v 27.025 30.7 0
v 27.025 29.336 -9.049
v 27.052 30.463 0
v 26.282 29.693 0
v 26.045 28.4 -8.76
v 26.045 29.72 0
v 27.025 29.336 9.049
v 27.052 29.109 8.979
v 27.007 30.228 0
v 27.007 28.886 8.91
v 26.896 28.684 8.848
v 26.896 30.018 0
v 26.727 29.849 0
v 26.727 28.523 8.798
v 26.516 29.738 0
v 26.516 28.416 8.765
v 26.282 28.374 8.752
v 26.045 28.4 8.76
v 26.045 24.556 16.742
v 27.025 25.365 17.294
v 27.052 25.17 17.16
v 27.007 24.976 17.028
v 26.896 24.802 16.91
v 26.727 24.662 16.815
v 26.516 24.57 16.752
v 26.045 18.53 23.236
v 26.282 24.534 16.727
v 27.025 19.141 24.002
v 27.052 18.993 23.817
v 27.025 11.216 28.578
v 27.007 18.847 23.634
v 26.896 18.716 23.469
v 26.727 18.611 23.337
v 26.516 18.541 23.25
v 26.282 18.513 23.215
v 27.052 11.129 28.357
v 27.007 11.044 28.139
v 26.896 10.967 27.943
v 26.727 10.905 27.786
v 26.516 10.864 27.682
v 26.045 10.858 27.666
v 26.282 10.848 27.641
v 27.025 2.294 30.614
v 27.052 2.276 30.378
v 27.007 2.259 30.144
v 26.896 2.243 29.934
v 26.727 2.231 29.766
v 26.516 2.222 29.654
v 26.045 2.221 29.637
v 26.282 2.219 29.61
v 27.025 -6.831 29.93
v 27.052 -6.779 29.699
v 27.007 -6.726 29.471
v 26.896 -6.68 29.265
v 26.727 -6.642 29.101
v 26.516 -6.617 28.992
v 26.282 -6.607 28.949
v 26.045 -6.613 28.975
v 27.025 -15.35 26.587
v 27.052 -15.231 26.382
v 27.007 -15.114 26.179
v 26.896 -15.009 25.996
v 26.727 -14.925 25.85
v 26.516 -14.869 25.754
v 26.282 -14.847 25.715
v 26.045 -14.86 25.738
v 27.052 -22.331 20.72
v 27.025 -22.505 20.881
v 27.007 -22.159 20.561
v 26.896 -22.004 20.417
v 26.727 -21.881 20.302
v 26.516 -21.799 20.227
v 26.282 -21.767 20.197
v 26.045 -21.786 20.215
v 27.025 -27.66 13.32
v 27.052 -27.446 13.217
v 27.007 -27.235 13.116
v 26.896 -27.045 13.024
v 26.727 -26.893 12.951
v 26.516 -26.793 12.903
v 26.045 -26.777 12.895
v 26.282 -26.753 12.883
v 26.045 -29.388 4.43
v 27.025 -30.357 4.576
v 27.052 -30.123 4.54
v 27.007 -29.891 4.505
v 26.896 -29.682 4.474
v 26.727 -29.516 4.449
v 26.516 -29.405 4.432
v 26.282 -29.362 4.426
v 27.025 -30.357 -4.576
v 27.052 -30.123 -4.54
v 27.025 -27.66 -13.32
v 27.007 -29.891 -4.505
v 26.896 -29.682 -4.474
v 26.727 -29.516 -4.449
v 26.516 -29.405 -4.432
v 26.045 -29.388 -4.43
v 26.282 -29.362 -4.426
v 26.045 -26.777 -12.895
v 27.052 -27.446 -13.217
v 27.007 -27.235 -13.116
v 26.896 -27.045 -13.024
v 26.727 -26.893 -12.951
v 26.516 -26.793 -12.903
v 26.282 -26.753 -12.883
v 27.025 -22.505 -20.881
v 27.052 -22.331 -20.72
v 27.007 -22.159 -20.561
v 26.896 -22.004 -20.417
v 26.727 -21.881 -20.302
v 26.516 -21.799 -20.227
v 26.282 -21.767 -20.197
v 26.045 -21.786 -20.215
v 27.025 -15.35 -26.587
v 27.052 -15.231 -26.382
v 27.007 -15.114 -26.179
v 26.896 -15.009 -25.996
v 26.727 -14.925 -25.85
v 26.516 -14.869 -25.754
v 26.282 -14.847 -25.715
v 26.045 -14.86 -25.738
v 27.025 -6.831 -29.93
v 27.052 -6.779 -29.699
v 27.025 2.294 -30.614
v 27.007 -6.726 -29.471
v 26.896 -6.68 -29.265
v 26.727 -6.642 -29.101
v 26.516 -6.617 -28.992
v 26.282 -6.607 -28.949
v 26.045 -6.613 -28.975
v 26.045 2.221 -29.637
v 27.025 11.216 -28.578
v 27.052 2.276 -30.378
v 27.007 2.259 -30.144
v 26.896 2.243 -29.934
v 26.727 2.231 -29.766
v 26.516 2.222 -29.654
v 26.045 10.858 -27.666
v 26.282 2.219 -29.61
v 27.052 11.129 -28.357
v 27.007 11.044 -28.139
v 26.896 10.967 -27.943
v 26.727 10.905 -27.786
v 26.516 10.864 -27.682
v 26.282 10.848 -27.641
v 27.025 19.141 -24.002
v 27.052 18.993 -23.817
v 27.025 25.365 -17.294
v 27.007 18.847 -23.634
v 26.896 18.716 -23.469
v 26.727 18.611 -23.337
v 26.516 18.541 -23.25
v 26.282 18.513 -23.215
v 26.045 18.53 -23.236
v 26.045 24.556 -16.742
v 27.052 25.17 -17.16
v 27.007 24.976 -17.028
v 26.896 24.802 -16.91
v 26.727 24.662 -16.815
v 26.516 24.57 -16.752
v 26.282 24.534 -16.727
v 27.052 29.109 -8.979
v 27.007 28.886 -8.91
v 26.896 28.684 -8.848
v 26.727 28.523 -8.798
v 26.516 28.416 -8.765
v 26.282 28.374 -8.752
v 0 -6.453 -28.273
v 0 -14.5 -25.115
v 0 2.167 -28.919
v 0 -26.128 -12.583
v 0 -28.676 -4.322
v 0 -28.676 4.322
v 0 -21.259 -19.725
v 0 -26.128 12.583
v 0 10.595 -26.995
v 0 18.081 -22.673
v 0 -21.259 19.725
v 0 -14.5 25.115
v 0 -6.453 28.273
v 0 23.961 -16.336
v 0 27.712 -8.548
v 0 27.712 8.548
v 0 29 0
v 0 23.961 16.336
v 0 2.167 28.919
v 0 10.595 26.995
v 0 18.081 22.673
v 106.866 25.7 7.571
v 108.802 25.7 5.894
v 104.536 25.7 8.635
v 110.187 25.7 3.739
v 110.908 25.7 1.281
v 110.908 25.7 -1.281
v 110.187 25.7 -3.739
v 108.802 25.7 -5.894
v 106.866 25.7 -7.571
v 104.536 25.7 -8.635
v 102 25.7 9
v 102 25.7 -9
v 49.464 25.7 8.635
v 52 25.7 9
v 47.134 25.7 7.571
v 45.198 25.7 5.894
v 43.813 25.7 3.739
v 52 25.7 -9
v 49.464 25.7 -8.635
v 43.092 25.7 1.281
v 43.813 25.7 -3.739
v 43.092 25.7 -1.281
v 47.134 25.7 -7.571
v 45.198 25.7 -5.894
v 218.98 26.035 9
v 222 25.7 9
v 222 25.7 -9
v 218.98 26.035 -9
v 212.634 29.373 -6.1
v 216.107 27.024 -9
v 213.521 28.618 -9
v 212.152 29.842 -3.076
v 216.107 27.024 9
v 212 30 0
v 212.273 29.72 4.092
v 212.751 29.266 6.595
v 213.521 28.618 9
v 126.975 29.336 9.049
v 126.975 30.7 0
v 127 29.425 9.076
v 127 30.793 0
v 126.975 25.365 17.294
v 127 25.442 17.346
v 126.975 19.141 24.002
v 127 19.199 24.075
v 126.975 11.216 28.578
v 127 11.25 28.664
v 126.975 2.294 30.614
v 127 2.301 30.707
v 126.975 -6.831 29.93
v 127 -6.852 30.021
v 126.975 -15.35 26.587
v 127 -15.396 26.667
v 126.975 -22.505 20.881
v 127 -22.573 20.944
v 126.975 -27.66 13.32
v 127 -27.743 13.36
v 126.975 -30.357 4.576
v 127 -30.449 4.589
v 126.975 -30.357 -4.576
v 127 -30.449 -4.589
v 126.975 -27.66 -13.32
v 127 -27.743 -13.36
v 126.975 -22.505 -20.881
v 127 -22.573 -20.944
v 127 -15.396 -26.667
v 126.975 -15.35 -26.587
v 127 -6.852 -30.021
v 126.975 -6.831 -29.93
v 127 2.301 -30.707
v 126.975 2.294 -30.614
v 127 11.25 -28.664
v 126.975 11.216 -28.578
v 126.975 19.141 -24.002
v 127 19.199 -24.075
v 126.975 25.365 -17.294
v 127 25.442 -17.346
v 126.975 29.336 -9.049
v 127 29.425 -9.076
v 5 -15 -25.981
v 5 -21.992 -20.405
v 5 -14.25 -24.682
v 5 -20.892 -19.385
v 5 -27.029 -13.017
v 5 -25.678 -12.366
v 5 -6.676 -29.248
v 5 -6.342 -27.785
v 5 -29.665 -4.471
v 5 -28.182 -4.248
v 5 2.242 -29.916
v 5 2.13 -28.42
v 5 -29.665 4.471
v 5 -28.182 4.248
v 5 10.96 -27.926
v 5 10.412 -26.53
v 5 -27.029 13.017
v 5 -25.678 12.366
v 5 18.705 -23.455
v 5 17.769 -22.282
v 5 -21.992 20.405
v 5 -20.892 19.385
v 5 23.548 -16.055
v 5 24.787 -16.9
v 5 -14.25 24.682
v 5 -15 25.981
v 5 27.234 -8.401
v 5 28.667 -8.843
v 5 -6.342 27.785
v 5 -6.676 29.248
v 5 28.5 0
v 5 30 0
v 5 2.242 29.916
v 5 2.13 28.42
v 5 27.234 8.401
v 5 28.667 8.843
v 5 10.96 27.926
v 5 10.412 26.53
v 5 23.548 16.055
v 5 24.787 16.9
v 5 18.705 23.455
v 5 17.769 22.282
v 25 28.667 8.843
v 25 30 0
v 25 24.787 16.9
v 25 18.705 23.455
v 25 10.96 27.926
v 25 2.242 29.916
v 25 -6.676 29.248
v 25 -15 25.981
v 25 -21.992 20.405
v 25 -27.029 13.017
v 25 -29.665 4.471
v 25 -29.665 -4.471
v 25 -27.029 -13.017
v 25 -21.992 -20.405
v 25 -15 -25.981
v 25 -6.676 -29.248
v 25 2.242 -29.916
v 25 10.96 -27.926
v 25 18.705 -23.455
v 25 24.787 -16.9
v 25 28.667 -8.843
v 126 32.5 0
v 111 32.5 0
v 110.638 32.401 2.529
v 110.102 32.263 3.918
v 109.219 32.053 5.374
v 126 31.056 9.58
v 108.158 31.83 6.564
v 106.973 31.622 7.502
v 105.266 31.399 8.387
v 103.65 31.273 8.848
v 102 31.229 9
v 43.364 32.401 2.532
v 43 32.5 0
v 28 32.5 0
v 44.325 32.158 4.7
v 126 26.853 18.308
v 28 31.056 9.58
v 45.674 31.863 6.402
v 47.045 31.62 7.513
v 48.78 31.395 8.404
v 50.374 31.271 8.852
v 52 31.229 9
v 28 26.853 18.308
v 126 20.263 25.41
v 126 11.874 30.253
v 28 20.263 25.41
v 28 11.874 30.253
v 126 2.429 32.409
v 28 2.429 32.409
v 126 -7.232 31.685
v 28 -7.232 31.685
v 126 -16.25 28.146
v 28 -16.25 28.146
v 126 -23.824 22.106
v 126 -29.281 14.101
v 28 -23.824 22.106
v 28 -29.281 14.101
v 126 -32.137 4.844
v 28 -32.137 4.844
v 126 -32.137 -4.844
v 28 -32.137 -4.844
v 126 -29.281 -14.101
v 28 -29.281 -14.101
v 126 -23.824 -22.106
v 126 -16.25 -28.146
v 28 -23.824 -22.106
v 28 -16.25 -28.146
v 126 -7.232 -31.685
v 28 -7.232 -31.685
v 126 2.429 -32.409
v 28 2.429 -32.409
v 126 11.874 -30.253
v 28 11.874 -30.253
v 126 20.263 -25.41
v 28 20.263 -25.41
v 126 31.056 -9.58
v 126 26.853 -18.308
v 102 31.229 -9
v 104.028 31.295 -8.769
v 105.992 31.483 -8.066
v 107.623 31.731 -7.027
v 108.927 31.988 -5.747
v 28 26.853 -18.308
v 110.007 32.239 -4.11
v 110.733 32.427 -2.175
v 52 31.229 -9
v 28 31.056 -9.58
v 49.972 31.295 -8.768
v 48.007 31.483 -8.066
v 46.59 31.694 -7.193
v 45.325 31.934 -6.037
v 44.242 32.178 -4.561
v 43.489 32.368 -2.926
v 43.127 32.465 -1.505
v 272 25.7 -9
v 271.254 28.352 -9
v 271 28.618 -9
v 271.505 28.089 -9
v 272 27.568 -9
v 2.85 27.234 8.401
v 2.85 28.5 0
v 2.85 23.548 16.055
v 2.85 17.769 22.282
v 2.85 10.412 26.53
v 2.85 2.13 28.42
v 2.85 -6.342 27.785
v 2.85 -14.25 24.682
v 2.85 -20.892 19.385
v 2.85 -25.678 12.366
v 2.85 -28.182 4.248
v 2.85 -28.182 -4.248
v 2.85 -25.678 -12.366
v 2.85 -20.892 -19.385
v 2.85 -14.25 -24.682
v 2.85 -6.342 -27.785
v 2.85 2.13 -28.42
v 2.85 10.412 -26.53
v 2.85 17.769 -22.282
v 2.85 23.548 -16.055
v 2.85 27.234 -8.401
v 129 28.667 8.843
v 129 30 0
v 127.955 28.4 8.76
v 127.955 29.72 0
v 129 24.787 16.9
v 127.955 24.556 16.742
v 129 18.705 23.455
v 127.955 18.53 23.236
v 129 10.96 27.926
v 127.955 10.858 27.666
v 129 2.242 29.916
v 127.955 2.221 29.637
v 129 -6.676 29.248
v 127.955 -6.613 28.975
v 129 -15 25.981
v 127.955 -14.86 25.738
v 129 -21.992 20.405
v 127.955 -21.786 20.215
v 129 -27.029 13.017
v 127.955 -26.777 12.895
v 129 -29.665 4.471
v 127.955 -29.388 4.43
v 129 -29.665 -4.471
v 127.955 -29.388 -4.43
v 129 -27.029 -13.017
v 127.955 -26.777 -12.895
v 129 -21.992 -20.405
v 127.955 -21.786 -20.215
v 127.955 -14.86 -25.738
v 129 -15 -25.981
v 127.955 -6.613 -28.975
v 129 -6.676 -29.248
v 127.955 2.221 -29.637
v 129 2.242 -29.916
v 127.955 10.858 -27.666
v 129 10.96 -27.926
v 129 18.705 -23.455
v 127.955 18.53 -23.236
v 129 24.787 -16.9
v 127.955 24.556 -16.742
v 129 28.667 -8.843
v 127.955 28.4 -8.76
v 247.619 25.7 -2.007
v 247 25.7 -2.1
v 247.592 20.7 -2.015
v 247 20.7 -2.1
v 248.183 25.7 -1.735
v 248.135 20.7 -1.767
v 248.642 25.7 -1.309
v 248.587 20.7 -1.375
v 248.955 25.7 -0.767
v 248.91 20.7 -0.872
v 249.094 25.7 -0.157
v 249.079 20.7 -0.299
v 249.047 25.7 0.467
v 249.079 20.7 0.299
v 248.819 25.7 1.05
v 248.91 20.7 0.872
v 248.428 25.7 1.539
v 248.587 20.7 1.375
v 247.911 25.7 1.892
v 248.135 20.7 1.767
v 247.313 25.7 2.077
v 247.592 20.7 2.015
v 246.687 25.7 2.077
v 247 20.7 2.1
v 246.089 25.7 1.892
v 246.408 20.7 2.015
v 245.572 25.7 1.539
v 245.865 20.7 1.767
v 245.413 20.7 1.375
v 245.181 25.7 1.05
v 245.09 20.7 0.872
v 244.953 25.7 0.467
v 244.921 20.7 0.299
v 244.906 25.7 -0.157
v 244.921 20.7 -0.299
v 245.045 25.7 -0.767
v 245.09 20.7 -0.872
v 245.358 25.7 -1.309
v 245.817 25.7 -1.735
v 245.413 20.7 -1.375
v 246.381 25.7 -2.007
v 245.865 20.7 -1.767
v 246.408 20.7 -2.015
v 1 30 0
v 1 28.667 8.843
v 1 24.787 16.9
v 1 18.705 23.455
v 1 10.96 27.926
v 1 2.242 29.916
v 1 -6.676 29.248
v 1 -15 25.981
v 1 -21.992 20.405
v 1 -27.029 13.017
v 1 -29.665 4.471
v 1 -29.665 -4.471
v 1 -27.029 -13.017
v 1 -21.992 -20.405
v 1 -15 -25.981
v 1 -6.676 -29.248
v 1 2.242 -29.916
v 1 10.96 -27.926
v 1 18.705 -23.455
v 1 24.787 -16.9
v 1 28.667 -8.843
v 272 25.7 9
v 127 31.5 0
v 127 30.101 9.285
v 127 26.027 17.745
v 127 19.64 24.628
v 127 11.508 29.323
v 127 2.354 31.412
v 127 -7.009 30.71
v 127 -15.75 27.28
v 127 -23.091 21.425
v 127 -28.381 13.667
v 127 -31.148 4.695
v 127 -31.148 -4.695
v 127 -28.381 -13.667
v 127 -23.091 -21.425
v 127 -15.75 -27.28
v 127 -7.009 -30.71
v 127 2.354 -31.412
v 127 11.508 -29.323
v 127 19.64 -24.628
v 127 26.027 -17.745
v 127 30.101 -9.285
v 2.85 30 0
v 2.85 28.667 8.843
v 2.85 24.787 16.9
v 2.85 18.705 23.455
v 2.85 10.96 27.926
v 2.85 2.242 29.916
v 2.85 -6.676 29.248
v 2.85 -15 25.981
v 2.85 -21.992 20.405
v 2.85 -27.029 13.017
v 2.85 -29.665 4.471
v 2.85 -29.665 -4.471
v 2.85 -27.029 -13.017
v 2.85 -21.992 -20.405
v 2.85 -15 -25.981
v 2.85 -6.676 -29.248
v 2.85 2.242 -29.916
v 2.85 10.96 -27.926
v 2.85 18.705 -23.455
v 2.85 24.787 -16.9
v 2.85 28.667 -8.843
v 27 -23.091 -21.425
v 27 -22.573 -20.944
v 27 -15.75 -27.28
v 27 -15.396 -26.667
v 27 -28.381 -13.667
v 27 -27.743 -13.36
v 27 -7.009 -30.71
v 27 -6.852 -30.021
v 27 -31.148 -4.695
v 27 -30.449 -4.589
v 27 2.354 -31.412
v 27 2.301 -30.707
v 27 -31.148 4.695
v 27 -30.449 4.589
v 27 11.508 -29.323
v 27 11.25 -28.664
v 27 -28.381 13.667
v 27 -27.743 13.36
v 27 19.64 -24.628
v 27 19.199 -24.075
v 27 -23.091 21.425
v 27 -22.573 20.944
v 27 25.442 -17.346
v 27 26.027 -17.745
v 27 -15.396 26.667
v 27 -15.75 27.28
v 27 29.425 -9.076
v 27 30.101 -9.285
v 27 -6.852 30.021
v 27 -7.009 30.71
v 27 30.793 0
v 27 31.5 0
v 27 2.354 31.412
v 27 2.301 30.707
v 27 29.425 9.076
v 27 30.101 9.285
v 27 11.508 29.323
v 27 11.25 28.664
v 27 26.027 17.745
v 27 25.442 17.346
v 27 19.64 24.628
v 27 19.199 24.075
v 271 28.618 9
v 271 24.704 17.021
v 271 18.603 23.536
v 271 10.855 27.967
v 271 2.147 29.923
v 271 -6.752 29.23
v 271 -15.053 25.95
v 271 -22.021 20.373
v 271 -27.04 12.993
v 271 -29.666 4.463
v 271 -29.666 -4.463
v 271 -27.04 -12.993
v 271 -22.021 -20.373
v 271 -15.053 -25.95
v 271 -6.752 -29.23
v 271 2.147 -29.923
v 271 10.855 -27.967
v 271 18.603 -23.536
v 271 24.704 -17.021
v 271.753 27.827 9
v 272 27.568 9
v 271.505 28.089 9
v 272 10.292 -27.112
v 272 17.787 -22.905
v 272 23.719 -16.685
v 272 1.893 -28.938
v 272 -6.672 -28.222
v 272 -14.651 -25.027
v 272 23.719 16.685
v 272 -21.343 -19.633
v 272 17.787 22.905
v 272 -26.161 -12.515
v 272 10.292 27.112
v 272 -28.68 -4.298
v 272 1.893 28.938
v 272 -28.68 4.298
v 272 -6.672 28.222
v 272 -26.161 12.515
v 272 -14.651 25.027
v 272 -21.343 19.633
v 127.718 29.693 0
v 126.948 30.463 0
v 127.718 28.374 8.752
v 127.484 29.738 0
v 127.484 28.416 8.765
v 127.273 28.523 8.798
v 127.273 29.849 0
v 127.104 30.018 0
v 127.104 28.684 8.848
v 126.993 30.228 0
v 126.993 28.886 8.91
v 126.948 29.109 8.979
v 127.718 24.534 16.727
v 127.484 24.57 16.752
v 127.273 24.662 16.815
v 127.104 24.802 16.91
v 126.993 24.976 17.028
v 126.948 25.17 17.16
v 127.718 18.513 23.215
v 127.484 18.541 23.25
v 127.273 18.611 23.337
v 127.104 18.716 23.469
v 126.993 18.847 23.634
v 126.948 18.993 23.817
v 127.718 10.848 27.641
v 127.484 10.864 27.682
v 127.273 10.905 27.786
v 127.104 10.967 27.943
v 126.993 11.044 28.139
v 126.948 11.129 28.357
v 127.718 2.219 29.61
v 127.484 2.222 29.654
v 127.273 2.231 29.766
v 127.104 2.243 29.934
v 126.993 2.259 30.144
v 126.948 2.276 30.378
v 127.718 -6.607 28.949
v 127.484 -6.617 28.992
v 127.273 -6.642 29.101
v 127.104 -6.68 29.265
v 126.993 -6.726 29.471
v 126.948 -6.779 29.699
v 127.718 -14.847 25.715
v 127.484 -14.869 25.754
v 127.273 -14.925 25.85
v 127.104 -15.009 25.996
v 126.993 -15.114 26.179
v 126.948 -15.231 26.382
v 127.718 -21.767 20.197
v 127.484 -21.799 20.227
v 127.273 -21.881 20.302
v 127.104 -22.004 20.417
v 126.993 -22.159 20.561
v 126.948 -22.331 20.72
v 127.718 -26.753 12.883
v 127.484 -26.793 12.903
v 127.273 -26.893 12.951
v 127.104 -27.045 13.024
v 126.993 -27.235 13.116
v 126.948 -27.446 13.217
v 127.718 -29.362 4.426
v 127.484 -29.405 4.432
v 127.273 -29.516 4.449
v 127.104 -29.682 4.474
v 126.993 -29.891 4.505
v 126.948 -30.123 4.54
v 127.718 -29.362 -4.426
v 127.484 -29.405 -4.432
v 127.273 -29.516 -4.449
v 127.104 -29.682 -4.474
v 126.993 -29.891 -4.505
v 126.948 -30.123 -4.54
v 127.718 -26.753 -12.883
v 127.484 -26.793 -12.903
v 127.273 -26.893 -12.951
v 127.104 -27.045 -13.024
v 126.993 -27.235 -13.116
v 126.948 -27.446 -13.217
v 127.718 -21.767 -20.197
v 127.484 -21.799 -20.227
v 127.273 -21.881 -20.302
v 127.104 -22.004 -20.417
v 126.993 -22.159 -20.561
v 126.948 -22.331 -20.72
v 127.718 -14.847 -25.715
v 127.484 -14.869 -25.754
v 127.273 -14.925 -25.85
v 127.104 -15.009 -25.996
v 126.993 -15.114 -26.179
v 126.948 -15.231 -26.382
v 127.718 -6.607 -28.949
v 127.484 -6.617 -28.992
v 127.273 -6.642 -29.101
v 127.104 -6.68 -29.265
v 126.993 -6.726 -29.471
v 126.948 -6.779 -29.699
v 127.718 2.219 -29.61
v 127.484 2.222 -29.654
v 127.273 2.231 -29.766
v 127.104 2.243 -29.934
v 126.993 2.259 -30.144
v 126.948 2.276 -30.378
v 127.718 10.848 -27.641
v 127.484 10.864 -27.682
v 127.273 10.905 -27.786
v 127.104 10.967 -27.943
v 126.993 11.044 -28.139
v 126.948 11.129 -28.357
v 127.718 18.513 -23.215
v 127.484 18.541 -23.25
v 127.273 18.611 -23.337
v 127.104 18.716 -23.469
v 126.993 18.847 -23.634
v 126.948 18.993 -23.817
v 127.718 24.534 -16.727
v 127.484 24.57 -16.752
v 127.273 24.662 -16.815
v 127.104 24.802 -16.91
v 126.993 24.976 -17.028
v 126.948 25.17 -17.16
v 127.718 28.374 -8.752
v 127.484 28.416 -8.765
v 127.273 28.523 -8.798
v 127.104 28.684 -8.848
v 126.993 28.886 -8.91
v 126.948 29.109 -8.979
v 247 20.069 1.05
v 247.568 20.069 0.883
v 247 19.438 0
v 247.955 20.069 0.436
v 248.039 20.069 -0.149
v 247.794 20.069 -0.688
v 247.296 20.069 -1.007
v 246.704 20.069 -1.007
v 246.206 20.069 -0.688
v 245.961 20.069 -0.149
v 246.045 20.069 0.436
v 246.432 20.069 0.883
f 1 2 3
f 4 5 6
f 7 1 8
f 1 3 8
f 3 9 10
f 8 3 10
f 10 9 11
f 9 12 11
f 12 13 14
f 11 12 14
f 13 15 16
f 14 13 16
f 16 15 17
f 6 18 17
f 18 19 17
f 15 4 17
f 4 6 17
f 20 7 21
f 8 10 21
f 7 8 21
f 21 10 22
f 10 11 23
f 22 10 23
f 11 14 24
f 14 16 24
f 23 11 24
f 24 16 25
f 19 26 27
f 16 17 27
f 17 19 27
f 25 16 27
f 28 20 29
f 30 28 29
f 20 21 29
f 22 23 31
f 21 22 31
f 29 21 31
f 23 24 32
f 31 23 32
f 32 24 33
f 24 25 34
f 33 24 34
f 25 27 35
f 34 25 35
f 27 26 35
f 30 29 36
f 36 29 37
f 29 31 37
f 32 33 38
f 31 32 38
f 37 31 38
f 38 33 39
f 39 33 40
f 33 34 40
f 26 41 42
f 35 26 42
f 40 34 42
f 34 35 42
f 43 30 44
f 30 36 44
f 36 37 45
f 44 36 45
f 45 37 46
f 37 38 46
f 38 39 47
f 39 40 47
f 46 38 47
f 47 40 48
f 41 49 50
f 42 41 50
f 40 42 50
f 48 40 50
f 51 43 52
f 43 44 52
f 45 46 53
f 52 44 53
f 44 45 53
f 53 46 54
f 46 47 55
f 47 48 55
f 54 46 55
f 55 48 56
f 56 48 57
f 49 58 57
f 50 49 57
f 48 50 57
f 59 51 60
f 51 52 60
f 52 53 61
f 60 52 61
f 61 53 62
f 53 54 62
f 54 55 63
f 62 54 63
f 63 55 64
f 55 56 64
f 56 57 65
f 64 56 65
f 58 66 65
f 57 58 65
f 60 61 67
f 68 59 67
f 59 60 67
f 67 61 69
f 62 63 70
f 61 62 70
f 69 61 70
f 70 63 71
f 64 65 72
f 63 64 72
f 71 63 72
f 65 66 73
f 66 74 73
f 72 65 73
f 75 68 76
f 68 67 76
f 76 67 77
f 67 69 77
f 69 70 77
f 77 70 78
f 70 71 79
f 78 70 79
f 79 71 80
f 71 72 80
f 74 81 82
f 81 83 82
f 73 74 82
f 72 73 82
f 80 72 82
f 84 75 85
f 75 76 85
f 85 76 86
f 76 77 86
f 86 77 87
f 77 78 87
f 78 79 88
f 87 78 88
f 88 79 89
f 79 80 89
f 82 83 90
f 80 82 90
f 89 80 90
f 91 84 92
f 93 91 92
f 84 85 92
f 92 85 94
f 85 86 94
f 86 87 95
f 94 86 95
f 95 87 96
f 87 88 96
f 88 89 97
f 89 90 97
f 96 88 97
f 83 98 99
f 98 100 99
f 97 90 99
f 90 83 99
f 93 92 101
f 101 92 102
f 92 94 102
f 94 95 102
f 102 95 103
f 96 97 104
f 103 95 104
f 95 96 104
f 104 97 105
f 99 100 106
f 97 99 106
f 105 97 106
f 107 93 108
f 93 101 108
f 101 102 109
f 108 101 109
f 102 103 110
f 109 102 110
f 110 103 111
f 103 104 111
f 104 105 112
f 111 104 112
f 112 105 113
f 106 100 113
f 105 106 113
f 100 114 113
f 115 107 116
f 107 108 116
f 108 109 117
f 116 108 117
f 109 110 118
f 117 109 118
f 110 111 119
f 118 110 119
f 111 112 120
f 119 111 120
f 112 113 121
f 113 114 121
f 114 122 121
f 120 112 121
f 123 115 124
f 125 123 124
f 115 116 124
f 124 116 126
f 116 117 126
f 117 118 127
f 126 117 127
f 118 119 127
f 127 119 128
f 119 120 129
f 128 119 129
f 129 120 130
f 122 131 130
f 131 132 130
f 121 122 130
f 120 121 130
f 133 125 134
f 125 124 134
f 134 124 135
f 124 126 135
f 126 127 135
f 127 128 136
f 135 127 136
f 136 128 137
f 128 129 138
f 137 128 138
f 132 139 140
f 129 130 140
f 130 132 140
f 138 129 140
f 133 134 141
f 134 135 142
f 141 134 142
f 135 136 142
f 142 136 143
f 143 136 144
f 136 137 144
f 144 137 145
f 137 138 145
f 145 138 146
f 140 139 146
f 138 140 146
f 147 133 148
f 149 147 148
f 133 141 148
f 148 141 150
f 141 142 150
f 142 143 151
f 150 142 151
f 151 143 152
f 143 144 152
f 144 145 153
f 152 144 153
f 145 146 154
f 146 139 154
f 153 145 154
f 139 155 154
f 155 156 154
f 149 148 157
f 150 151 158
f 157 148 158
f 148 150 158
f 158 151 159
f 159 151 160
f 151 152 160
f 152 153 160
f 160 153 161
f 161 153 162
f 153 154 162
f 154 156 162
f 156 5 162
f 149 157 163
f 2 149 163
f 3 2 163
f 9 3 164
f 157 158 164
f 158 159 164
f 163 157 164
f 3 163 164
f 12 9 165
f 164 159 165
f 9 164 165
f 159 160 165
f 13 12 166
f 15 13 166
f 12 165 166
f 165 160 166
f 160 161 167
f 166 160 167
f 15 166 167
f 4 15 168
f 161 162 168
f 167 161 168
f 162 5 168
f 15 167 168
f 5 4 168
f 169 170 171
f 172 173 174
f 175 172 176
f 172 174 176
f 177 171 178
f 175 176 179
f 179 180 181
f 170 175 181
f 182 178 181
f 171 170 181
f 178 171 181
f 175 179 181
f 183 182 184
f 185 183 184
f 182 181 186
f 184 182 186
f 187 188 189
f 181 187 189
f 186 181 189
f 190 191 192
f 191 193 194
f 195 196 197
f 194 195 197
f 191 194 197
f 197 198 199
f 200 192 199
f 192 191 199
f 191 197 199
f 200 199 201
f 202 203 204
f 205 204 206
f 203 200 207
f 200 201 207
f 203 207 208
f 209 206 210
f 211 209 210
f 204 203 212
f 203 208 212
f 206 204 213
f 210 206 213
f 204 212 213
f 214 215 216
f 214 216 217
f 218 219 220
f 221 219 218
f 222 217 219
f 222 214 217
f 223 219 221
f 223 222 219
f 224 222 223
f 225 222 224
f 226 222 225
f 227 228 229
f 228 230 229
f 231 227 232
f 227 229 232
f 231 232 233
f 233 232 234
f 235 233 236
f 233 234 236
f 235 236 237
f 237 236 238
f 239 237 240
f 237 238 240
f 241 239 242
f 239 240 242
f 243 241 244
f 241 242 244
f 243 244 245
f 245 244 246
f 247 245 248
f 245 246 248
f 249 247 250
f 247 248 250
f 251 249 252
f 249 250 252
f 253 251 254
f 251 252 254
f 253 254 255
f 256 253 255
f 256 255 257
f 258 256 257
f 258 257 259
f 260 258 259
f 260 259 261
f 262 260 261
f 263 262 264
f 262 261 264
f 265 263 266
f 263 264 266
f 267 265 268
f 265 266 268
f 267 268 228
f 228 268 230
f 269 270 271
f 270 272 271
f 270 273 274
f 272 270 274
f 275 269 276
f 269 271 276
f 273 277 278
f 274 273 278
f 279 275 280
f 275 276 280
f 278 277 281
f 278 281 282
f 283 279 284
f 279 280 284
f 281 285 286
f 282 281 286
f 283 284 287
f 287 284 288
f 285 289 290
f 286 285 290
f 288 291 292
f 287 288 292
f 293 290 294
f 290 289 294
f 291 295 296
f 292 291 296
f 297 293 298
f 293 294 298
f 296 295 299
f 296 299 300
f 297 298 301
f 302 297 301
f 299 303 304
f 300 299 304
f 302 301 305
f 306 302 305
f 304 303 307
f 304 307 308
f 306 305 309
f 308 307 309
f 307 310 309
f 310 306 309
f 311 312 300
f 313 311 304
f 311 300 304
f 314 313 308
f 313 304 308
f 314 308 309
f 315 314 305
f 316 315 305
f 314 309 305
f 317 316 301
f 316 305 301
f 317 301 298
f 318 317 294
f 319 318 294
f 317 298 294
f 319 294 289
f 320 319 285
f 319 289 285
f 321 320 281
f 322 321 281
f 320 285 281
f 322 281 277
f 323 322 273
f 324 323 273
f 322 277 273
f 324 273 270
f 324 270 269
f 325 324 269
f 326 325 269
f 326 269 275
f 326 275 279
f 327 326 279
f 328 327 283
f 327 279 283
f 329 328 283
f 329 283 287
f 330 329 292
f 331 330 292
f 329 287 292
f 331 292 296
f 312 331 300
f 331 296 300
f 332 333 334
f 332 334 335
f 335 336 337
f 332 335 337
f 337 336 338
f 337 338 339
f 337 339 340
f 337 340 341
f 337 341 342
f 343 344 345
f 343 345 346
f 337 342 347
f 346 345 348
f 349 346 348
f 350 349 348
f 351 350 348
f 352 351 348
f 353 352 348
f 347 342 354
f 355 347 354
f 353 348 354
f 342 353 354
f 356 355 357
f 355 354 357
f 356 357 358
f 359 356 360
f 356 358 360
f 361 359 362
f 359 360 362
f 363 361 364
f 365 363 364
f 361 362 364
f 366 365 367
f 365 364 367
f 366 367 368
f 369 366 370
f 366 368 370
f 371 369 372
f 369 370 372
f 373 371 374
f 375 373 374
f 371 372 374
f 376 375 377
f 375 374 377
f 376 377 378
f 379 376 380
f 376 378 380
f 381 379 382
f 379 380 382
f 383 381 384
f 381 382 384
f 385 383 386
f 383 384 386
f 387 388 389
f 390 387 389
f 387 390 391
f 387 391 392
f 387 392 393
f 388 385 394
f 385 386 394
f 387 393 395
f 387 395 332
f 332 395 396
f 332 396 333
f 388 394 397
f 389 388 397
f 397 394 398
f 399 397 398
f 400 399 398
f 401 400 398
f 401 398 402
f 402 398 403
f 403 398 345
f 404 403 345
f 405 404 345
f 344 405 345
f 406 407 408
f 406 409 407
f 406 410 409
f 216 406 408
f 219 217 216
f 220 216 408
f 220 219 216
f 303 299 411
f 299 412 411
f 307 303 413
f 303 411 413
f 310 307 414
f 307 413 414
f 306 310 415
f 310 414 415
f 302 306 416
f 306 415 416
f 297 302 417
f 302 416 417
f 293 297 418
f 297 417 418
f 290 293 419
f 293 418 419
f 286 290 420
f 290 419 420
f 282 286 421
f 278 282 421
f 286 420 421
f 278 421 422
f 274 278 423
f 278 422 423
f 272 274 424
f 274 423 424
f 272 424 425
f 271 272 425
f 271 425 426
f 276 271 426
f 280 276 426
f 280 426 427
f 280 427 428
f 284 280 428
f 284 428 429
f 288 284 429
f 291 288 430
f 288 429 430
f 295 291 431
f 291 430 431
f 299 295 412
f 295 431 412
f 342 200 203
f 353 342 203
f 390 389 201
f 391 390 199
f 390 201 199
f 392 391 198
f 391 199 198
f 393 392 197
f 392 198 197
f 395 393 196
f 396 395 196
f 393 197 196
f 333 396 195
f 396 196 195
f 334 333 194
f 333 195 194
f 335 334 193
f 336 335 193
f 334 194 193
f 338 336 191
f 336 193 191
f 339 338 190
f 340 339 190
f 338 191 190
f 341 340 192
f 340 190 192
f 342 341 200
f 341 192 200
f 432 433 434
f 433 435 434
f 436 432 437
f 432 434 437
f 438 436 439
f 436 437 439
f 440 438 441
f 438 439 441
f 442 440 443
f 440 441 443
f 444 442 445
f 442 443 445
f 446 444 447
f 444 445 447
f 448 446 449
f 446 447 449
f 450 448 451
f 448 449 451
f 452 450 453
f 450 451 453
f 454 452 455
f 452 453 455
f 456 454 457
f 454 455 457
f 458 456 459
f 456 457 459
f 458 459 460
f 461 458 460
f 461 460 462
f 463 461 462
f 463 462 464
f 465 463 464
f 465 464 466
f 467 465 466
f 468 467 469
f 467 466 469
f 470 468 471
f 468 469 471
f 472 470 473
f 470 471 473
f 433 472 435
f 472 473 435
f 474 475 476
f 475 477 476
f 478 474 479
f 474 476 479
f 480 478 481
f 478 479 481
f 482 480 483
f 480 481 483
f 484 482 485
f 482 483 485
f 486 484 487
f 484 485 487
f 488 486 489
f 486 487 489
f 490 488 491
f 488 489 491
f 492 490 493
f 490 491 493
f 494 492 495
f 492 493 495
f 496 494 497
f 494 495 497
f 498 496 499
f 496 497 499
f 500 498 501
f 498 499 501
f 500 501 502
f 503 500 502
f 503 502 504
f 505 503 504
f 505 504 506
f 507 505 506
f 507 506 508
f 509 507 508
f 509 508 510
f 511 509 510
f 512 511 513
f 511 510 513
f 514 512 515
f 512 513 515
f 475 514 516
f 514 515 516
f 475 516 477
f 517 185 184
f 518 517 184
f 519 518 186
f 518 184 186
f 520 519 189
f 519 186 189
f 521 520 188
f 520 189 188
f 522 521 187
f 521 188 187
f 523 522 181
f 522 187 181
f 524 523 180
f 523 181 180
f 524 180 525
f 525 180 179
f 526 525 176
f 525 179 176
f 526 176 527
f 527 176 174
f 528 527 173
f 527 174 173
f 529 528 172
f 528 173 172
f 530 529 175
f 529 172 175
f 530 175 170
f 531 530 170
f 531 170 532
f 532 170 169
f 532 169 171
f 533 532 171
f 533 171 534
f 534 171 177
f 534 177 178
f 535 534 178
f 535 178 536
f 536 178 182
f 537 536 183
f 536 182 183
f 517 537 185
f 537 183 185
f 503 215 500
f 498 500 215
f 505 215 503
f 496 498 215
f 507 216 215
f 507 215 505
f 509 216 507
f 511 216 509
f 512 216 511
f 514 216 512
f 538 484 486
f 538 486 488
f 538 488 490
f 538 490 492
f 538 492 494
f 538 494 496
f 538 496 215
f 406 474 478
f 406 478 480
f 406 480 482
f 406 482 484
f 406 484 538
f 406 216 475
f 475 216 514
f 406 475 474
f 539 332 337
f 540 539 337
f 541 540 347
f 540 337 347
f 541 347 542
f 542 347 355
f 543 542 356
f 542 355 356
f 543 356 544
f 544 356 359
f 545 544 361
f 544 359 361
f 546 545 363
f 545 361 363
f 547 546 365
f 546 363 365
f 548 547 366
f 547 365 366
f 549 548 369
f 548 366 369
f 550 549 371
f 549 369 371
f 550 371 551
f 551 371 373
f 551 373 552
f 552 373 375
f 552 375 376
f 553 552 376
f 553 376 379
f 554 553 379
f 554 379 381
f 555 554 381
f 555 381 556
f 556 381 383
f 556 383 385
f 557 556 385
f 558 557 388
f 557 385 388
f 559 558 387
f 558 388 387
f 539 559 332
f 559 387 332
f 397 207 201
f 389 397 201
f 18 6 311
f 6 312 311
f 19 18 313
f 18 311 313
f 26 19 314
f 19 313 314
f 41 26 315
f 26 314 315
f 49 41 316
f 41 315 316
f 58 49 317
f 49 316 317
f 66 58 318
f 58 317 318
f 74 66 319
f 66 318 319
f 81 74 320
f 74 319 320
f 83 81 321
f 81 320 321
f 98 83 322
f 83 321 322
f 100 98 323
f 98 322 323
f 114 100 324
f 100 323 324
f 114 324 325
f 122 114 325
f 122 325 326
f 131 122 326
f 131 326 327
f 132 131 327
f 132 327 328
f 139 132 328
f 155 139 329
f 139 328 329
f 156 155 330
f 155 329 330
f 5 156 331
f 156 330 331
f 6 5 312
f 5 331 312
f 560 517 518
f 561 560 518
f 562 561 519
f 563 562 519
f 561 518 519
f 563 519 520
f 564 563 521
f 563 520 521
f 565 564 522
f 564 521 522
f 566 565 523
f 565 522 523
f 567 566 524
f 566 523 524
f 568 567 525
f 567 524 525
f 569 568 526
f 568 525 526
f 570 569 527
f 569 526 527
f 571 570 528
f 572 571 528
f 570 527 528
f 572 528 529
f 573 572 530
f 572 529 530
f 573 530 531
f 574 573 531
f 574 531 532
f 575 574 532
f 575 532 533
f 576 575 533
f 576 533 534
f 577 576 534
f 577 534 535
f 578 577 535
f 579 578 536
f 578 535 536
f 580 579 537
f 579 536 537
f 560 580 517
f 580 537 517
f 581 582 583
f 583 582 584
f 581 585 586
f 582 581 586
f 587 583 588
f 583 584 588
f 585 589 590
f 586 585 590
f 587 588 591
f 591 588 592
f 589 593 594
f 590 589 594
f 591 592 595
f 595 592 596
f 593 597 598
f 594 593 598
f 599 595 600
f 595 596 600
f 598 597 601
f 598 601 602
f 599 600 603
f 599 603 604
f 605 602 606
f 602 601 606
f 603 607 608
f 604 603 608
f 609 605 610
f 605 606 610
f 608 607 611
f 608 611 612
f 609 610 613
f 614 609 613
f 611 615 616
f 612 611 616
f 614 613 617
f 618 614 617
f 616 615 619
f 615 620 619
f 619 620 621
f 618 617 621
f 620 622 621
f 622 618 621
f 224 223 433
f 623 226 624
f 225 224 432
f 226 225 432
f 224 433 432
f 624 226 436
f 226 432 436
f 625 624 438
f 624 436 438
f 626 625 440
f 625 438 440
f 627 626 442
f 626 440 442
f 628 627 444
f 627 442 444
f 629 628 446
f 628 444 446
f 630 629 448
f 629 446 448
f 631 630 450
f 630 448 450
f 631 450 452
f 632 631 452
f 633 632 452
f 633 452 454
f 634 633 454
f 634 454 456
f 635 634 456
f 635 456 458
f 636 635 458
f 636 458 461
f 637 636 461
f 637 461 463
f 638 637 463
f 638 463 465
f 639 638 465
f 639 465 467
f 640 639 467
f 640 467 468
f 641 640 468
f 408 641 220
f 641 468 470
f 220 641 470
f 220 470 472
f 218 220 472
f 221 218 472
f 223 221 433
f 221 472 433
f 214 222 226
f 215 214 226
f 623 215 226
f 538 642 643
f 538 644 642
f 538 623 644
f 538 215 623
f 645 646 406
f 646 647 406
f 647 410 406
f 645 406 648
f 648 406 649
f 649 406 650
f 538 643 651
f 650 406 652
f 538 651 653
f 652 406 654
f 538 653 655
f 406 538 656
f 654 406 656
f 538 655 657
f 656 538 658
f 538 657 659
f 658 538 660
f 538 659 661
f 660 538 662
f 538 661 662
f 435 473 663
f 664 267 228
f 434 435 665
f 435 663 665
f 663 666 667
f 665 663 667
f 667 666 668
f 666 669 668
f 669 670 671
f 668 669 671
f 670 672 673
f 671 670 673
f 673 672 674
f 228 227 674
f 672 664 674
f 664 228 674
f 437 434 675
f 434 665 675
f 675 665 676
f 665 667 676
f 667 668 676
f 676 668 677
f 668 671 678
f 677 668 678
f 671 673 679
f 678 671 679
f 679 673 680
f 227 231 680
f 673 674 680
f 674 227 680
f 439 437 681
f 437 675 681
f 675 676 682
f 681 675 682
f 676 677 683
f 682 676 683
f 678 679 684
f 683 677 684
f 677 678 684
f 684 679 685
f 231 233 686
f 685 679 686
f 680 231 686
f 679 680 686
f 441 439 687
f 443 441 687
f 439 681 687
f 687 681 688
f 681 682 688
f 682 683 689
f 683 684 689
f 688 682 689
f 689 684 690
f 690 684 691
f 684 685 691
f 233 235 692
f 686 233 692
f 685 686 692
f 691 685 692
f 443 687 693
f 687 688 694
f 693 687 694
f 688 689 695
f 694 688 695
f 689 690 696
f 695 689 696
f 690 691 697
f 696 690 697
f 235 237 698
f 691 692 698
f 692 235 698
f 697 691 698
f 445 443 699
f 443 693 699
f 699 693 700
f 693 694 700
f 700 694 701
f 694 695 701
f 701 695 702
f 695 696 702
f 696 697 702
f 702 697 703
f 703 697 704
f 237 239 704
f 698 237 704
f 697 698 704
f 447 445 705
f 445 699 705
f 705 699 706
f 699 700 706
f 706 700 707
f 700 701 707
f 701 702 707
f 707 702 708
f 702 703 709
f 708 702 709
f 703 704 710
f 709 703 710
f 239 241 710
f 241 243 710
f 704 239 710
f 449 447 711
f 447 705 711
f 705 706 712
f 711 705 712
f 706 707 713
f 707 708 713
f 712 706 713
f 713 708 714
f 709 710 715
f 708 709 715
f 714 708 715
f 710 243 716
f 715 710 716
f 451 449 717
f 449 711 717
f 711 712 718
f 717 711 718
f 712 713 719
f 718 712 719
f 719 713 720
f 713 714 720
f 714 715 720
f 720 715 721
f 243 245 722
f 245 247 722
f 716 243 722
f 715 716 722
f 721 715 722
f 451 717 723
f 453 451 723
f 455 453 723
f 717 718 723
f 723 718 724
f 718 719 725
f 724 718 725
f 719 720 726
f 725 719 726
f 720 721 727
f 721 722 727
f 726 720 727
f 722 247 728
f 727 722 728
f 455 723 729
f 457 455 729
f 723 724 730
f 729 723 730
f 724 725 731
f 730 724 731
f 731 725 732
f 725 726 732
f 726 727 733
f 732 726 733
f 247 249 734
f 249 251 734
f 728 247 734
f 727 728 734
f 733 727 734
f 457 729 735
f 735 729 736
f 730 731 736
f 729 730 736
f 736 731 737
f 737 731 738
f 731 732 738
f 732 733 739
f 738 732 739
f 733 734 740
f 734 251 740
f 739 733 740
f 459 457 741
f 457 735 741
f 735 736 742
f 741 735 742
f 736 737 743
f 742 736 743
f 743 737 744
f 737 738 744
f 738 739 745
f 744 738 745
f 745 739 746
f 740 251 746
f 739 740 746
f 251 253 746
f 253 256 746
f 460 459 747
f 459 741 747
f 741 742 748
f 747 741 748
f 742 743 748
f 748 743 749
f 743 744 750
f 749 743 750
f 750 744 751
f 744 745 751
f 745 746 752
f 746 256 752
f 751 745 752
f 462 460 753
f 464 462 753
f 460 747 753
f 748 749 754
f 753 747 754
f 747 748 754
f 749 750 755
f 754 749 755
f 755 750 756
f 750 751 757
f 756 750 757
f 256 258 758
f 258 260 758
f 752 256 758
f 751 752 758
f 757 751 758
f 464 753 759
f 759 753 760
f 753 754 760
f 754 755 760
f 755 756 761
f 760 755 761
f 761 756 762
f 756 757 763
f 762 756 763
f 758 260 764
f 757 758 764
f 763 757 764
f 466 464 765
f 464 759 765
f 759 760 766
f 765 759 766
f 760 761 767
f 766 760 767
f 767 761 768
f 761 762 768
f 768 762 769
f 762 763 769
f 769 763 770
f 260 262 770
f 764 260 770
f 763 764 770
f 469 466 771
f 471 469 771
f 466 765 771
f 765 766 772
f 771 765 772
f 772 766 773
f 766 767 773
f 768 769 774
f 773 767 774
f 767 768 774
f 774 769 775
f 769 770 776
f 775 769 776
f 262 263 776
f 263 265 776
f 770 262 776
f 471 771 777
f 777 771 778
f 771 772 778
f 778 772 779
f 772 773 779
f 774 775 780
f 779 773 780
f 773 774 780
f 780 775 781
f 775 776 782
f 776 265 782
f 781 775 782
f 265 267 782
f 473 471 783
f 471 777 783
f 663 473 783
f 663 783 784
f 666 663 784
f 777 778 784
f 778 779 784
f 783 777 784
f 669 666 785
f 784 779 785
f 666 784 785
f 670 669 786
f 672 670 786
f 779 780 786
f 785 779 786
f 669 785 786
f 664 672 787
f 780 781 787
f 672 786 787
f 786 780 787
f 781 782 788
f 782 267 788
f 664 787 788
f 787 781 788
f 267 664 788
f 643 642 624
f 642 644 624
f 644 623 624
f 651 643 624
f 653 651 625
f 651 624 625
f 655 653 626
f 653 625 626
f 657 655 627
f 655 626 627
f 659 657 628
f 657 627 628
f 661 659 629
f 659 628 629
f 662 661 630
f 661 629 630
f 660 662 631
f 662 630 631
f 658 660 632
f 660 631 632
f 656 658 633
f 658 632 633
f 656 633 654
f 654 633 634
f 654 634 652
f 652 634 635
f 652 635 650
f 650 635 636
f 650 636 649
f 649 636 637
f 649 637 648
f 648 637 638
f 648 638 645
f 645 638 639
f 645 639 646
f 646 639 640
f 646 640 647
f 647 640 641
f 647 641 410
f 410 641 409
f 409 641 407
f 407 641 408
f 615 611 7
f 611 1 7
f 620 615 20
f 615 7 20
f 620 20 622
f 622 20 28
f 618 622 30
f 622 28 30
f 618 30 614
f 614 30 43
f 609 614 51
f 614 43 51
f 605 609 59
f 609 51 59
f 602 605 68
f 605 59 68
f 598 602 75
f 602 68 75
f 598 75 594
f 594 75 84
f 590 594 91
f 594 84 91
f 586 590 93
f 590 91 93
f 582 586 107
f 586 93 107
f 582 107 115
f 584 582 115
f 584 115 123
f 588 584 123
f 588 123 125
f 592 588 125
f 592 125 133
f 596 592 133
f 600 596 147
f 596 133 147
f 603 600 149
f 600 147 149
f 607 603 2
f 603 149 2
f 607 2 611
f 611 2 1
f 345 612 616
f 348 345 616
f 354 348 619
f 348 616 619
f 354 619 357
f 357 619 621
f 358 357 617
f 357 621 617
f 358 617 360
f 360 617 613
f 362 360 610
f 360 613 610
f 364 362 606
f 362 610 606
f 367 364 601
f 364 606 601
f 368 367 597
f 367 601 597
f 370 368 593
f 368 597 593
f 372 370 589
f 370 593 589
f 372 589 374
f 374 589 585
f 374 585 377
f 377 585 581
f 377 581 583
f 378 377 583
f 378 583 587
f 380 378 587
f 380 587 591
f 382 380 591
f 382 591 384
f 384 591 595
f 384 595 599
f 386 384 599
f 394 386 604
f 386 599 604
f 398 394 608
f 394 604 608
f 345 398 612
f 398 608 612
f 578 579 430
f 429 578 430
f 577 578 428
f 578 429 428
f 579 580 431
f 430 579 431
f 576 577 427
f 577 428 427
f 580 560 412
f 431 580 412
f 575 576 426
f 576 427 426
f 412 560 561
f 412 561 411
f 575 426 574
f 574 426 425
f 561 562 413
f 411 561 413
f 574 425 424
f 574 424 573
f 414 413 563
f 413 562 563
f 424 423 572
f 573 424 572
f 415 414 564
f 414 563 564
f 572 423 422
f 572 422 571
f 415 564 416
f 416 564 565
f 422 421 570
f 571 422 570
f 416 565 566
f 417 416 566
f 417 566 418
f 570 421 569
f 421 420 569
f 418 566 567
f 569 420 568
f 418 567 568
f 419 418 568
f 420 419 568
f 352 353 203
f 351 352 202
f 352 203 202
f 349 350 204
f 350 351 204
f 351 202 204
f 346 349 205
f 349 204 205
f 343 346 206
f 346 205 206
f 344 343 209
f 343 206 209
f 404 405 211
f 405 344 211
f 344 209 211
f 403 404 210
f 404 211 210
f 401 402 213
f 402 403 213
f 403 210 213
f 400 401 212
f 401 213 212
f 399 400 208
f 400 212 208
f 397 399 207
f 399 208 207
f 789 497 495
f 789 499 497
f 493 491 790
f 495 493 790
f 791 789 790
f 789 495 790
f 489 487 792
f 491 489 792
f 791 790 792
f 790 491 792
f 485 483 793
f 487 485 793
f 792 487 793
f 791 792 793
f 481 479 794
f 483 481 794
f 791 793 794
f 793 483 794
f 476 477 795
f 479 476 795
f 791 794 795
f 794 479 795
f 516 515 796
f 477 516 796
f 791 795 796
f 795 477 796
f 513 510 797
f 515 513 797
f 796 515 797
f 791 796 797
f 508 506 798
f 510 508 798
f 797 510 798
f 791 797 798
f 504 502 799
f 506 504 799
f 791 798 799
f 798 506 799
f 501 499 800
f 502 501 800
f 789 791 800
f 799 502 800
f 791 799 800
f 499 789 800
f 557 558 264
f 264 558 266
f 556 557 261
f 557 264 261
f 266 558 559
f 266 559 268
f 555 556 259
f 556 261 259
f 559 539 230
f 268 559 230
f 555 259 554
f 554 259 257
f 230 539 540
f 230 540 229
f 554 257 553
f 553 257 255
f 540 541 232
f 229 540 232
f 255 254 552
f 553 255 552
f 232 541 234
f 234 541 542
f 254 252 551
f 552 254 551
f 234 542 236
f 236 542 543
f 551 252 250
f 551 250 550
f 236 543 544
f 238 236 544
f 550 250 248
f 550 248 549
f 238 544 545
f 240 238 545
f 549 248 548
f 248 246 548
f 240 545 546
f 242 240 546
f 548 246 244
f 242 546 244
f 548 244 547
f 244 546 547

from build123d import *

# Parameters (mm, degrees)
CHAMFER1_SIZE                  = 1
CUT_EXTRUDE1_REACH             = 8.8
F_5_0MM_DOWEL_HOLE1_D          = 4.2
F_5_0MM_DOWEL_HOLE1_DEPTH      = 5
F_5_0MM_DOWEL_HOLE1_TIP        = 1.2618073
CUT_EXTRUDE2_REACH             = 34.5
CUT_EXTRUDE2_DIRECTION_2_REACH = 34.5


with BuildPart() as part:
    # Sketch1 → Revolve1 (revolve)
    with BuildSketch(Plane.XY):
        with BuildLine():
            Line((0, 0), (272, 0))
            Line((272, 0), (272, 30))
            Line((272, 30), (129, 30))
            Line((129, 30), (127.954891423, 29.719964001))
            ThreePointArc((127.954891423, 29.719964001), (127.182150762, 29.927019237), (126.975095526, 30.699759898))
            Line((126.975095526, 30.699759898), (127, 30.792704662))
            Line((127, 30.792704662), (127, 32.5))
            Line((127, 32.5), (27, 32.5))
            Line((27, 32.5), (27, 30.792704662))
            Line((27, 30.792704662), (27.024904474, 30.699759898))
            ThreePointArc((27.024904474, 30.699759898), (26.817849238, 29.927019237), (26.045108577, 29.719964001))
            Line((26.045108577, 29.719964001), (25, 30))
            Line((25, 30), (5, 30))
            Line((5, 30), (5, 28.5))
            Line((5, 28.5), (2.85, 28.5))
            Line((2.85, 28.5), (2.85, 30))
            Line((2.85, 30), (0, 30))
            Line((0, 30), (0, 0))
        make_face()
    revolve(axis=Axis((0, 0, 0), (1, 0, 0)))

    # Chamfer1
    chamfer1_edges = [part.edges().sort_by_distance(p)[0] for p in [
        (272, -30, 0),
        (127, -32.5, 0),
        (27, -32.5, 0),
        (0, -30, 0),
    ]]
    chamfer(chamfer1_edges, length=CHAMFER1_SIZE)

    # Sketch2 → Cut-Extrude1 (cut, up to next)
    with BuildSketch(Plane(origin=(0, 25.7, 0), x_dir=(1, 0, 0), z_dir=(0, 1, 0)), mode=Mode.PRIVATE) as cut_extrude1_sk1:
        Polygon((272, 9), (222, 9), (222, -9), (272, -9), (272, 0), align=None)
    cut_extrude1_tool1 = extrude(cut_extrude1_sk1.sketch, amount=CUT_EXTRUDE1_REACH, mode=Mode.PRIVATE) & part.part
    add(cut_extrude1_tool1.solids().sort_by_distance((247, 25.7, 0))[0], mode=Mode.SUBTRACT)
    # Sketch2 → Cut-Extrude1 (cut, up to next)
    with BuildSketch(Plane(origin=(0, 25.7, 0), x_dir=(1, 0, 0), z_dir=(0, 1, 0)), mode=Mode.PRIVATE) as cut_extrude1_sk2:
        with BuildLine():
            Line((52, 9), (102, 9))
            ThreePointArc((102, 9), (111, 0), (102, -9))
            Line((102, -9), (52, -9))
            ThreePointArc((52, -9), (43, 0), (52, 9))
        make_face()
    cut_extrude1_tool2 = extrude(cut_extrude1_sk2.sketch, amount=CUT_EXTRUDE1_REACH, mode=Mode.PRIVATE) & part.part
    add(cut_extrude1_tool2.solids().sort_by_distance((77, 25.7, 0))[0], mode=Mode.SUBTRACT)

    # Ø5.0mm Dowel Hole1
    with Locations(Plane(origin=(247, 25.7, 0), x_dir=(0, 0, 1), z_dir=(0, 1, 0))):
        with Locations((0, 0)):
            Hole(F_5_0MM_DOWEL_HOLE1_D / 2, depth=F_5_0MM_DOWEL_HOLE1_DEPTH)
            with Locations((0, 0, -(F_5_0MM_DOWEL_HOLE1_DEPTH + F_5_0MM_DOWEL_HOLE1_TIP / 2))):  # 118° drill point
                Cone(0, F_5_0MM_DOWEL_HOLE1_D / 2, F_5_0MM_DOWEL_HOLE1_TIP, mode=Mode.SUBTRACT)

    # Cut-Extrude2: up to this face of the body (flat: up to its plane)
    cut_extrude2_end = Plane(part.part.faces().sort_by_distance((246.910970255, 27.155084714, -9))[0])
    # Sketch5 → Cut-Extrude2 (cut, up to the picked face)
    with BuildSketch(Plane.XY, mode=Mode.PRIVATE) as cut_extrude2_sk1:
        with BuildLine():
            Line((222, 30), (222, 25.7))
            ThreePointArc((222, 25.7), (216.557344398, 26.820568368), (212, 30))
            Line((212, 30), (222, 30))
        make_face()
    cut_extrude2_tool1 = split(extrude(cut_extrude2_sk1.sketch, amount=-CUT_EXTRUDE2_REACH, mode=Mode.PRIVATE), bisect_by=cut_extrude2_end, keep=Keep.BOTH, mode=Mode.PRIVATE)
    add(cut_extrude2_tool1.solids().sort_by_distance((218.157433, 28.254696, 0))[0], mode=Mode.SUBTRACT)

    # Cut-Extrude2 direction 2: up to this face of the body (flat: up to its plane)
    cut_extrude2_direction_2_end = Plane(part.part.faces().sort_by_distance((246.910970255, 27.155084714, 9))[0])
    # Sketch5 → Cut-Extrude2 direction 2 (cut, up to the picked face)
    with BuildSketch(Plane.XY, mode=Mode.PRIVATE) as cut_extrude2_direction_2_sk1:
        with BuildLine():
            Line((222, 30), (222, 25.7))
            ThreePointArc((222, 25.7), (216.557344398, 26.820568368), (212, 30))
            Line((212, 30), (222, 30))
        make_face()
    cut_extrude2_direction_2_tool1 = split(extrude(cut_extrude2_direction_2_sk1.sketch, amount=CUT_EXTRUDE2_DIRECTION_2_REACH, mode=Mode.PRIVATE), bisect_by=cut_extrude2_direction_2_end, keep=Keep.BOTH, mode=Mode.PRIVATE)
    add(cut_extrude2_direction_2_tool1.solids().sort_by_distance((218.157433, 28.254696, 0))[0], mode=Mode.SUBTRACT)


solid = part.part
